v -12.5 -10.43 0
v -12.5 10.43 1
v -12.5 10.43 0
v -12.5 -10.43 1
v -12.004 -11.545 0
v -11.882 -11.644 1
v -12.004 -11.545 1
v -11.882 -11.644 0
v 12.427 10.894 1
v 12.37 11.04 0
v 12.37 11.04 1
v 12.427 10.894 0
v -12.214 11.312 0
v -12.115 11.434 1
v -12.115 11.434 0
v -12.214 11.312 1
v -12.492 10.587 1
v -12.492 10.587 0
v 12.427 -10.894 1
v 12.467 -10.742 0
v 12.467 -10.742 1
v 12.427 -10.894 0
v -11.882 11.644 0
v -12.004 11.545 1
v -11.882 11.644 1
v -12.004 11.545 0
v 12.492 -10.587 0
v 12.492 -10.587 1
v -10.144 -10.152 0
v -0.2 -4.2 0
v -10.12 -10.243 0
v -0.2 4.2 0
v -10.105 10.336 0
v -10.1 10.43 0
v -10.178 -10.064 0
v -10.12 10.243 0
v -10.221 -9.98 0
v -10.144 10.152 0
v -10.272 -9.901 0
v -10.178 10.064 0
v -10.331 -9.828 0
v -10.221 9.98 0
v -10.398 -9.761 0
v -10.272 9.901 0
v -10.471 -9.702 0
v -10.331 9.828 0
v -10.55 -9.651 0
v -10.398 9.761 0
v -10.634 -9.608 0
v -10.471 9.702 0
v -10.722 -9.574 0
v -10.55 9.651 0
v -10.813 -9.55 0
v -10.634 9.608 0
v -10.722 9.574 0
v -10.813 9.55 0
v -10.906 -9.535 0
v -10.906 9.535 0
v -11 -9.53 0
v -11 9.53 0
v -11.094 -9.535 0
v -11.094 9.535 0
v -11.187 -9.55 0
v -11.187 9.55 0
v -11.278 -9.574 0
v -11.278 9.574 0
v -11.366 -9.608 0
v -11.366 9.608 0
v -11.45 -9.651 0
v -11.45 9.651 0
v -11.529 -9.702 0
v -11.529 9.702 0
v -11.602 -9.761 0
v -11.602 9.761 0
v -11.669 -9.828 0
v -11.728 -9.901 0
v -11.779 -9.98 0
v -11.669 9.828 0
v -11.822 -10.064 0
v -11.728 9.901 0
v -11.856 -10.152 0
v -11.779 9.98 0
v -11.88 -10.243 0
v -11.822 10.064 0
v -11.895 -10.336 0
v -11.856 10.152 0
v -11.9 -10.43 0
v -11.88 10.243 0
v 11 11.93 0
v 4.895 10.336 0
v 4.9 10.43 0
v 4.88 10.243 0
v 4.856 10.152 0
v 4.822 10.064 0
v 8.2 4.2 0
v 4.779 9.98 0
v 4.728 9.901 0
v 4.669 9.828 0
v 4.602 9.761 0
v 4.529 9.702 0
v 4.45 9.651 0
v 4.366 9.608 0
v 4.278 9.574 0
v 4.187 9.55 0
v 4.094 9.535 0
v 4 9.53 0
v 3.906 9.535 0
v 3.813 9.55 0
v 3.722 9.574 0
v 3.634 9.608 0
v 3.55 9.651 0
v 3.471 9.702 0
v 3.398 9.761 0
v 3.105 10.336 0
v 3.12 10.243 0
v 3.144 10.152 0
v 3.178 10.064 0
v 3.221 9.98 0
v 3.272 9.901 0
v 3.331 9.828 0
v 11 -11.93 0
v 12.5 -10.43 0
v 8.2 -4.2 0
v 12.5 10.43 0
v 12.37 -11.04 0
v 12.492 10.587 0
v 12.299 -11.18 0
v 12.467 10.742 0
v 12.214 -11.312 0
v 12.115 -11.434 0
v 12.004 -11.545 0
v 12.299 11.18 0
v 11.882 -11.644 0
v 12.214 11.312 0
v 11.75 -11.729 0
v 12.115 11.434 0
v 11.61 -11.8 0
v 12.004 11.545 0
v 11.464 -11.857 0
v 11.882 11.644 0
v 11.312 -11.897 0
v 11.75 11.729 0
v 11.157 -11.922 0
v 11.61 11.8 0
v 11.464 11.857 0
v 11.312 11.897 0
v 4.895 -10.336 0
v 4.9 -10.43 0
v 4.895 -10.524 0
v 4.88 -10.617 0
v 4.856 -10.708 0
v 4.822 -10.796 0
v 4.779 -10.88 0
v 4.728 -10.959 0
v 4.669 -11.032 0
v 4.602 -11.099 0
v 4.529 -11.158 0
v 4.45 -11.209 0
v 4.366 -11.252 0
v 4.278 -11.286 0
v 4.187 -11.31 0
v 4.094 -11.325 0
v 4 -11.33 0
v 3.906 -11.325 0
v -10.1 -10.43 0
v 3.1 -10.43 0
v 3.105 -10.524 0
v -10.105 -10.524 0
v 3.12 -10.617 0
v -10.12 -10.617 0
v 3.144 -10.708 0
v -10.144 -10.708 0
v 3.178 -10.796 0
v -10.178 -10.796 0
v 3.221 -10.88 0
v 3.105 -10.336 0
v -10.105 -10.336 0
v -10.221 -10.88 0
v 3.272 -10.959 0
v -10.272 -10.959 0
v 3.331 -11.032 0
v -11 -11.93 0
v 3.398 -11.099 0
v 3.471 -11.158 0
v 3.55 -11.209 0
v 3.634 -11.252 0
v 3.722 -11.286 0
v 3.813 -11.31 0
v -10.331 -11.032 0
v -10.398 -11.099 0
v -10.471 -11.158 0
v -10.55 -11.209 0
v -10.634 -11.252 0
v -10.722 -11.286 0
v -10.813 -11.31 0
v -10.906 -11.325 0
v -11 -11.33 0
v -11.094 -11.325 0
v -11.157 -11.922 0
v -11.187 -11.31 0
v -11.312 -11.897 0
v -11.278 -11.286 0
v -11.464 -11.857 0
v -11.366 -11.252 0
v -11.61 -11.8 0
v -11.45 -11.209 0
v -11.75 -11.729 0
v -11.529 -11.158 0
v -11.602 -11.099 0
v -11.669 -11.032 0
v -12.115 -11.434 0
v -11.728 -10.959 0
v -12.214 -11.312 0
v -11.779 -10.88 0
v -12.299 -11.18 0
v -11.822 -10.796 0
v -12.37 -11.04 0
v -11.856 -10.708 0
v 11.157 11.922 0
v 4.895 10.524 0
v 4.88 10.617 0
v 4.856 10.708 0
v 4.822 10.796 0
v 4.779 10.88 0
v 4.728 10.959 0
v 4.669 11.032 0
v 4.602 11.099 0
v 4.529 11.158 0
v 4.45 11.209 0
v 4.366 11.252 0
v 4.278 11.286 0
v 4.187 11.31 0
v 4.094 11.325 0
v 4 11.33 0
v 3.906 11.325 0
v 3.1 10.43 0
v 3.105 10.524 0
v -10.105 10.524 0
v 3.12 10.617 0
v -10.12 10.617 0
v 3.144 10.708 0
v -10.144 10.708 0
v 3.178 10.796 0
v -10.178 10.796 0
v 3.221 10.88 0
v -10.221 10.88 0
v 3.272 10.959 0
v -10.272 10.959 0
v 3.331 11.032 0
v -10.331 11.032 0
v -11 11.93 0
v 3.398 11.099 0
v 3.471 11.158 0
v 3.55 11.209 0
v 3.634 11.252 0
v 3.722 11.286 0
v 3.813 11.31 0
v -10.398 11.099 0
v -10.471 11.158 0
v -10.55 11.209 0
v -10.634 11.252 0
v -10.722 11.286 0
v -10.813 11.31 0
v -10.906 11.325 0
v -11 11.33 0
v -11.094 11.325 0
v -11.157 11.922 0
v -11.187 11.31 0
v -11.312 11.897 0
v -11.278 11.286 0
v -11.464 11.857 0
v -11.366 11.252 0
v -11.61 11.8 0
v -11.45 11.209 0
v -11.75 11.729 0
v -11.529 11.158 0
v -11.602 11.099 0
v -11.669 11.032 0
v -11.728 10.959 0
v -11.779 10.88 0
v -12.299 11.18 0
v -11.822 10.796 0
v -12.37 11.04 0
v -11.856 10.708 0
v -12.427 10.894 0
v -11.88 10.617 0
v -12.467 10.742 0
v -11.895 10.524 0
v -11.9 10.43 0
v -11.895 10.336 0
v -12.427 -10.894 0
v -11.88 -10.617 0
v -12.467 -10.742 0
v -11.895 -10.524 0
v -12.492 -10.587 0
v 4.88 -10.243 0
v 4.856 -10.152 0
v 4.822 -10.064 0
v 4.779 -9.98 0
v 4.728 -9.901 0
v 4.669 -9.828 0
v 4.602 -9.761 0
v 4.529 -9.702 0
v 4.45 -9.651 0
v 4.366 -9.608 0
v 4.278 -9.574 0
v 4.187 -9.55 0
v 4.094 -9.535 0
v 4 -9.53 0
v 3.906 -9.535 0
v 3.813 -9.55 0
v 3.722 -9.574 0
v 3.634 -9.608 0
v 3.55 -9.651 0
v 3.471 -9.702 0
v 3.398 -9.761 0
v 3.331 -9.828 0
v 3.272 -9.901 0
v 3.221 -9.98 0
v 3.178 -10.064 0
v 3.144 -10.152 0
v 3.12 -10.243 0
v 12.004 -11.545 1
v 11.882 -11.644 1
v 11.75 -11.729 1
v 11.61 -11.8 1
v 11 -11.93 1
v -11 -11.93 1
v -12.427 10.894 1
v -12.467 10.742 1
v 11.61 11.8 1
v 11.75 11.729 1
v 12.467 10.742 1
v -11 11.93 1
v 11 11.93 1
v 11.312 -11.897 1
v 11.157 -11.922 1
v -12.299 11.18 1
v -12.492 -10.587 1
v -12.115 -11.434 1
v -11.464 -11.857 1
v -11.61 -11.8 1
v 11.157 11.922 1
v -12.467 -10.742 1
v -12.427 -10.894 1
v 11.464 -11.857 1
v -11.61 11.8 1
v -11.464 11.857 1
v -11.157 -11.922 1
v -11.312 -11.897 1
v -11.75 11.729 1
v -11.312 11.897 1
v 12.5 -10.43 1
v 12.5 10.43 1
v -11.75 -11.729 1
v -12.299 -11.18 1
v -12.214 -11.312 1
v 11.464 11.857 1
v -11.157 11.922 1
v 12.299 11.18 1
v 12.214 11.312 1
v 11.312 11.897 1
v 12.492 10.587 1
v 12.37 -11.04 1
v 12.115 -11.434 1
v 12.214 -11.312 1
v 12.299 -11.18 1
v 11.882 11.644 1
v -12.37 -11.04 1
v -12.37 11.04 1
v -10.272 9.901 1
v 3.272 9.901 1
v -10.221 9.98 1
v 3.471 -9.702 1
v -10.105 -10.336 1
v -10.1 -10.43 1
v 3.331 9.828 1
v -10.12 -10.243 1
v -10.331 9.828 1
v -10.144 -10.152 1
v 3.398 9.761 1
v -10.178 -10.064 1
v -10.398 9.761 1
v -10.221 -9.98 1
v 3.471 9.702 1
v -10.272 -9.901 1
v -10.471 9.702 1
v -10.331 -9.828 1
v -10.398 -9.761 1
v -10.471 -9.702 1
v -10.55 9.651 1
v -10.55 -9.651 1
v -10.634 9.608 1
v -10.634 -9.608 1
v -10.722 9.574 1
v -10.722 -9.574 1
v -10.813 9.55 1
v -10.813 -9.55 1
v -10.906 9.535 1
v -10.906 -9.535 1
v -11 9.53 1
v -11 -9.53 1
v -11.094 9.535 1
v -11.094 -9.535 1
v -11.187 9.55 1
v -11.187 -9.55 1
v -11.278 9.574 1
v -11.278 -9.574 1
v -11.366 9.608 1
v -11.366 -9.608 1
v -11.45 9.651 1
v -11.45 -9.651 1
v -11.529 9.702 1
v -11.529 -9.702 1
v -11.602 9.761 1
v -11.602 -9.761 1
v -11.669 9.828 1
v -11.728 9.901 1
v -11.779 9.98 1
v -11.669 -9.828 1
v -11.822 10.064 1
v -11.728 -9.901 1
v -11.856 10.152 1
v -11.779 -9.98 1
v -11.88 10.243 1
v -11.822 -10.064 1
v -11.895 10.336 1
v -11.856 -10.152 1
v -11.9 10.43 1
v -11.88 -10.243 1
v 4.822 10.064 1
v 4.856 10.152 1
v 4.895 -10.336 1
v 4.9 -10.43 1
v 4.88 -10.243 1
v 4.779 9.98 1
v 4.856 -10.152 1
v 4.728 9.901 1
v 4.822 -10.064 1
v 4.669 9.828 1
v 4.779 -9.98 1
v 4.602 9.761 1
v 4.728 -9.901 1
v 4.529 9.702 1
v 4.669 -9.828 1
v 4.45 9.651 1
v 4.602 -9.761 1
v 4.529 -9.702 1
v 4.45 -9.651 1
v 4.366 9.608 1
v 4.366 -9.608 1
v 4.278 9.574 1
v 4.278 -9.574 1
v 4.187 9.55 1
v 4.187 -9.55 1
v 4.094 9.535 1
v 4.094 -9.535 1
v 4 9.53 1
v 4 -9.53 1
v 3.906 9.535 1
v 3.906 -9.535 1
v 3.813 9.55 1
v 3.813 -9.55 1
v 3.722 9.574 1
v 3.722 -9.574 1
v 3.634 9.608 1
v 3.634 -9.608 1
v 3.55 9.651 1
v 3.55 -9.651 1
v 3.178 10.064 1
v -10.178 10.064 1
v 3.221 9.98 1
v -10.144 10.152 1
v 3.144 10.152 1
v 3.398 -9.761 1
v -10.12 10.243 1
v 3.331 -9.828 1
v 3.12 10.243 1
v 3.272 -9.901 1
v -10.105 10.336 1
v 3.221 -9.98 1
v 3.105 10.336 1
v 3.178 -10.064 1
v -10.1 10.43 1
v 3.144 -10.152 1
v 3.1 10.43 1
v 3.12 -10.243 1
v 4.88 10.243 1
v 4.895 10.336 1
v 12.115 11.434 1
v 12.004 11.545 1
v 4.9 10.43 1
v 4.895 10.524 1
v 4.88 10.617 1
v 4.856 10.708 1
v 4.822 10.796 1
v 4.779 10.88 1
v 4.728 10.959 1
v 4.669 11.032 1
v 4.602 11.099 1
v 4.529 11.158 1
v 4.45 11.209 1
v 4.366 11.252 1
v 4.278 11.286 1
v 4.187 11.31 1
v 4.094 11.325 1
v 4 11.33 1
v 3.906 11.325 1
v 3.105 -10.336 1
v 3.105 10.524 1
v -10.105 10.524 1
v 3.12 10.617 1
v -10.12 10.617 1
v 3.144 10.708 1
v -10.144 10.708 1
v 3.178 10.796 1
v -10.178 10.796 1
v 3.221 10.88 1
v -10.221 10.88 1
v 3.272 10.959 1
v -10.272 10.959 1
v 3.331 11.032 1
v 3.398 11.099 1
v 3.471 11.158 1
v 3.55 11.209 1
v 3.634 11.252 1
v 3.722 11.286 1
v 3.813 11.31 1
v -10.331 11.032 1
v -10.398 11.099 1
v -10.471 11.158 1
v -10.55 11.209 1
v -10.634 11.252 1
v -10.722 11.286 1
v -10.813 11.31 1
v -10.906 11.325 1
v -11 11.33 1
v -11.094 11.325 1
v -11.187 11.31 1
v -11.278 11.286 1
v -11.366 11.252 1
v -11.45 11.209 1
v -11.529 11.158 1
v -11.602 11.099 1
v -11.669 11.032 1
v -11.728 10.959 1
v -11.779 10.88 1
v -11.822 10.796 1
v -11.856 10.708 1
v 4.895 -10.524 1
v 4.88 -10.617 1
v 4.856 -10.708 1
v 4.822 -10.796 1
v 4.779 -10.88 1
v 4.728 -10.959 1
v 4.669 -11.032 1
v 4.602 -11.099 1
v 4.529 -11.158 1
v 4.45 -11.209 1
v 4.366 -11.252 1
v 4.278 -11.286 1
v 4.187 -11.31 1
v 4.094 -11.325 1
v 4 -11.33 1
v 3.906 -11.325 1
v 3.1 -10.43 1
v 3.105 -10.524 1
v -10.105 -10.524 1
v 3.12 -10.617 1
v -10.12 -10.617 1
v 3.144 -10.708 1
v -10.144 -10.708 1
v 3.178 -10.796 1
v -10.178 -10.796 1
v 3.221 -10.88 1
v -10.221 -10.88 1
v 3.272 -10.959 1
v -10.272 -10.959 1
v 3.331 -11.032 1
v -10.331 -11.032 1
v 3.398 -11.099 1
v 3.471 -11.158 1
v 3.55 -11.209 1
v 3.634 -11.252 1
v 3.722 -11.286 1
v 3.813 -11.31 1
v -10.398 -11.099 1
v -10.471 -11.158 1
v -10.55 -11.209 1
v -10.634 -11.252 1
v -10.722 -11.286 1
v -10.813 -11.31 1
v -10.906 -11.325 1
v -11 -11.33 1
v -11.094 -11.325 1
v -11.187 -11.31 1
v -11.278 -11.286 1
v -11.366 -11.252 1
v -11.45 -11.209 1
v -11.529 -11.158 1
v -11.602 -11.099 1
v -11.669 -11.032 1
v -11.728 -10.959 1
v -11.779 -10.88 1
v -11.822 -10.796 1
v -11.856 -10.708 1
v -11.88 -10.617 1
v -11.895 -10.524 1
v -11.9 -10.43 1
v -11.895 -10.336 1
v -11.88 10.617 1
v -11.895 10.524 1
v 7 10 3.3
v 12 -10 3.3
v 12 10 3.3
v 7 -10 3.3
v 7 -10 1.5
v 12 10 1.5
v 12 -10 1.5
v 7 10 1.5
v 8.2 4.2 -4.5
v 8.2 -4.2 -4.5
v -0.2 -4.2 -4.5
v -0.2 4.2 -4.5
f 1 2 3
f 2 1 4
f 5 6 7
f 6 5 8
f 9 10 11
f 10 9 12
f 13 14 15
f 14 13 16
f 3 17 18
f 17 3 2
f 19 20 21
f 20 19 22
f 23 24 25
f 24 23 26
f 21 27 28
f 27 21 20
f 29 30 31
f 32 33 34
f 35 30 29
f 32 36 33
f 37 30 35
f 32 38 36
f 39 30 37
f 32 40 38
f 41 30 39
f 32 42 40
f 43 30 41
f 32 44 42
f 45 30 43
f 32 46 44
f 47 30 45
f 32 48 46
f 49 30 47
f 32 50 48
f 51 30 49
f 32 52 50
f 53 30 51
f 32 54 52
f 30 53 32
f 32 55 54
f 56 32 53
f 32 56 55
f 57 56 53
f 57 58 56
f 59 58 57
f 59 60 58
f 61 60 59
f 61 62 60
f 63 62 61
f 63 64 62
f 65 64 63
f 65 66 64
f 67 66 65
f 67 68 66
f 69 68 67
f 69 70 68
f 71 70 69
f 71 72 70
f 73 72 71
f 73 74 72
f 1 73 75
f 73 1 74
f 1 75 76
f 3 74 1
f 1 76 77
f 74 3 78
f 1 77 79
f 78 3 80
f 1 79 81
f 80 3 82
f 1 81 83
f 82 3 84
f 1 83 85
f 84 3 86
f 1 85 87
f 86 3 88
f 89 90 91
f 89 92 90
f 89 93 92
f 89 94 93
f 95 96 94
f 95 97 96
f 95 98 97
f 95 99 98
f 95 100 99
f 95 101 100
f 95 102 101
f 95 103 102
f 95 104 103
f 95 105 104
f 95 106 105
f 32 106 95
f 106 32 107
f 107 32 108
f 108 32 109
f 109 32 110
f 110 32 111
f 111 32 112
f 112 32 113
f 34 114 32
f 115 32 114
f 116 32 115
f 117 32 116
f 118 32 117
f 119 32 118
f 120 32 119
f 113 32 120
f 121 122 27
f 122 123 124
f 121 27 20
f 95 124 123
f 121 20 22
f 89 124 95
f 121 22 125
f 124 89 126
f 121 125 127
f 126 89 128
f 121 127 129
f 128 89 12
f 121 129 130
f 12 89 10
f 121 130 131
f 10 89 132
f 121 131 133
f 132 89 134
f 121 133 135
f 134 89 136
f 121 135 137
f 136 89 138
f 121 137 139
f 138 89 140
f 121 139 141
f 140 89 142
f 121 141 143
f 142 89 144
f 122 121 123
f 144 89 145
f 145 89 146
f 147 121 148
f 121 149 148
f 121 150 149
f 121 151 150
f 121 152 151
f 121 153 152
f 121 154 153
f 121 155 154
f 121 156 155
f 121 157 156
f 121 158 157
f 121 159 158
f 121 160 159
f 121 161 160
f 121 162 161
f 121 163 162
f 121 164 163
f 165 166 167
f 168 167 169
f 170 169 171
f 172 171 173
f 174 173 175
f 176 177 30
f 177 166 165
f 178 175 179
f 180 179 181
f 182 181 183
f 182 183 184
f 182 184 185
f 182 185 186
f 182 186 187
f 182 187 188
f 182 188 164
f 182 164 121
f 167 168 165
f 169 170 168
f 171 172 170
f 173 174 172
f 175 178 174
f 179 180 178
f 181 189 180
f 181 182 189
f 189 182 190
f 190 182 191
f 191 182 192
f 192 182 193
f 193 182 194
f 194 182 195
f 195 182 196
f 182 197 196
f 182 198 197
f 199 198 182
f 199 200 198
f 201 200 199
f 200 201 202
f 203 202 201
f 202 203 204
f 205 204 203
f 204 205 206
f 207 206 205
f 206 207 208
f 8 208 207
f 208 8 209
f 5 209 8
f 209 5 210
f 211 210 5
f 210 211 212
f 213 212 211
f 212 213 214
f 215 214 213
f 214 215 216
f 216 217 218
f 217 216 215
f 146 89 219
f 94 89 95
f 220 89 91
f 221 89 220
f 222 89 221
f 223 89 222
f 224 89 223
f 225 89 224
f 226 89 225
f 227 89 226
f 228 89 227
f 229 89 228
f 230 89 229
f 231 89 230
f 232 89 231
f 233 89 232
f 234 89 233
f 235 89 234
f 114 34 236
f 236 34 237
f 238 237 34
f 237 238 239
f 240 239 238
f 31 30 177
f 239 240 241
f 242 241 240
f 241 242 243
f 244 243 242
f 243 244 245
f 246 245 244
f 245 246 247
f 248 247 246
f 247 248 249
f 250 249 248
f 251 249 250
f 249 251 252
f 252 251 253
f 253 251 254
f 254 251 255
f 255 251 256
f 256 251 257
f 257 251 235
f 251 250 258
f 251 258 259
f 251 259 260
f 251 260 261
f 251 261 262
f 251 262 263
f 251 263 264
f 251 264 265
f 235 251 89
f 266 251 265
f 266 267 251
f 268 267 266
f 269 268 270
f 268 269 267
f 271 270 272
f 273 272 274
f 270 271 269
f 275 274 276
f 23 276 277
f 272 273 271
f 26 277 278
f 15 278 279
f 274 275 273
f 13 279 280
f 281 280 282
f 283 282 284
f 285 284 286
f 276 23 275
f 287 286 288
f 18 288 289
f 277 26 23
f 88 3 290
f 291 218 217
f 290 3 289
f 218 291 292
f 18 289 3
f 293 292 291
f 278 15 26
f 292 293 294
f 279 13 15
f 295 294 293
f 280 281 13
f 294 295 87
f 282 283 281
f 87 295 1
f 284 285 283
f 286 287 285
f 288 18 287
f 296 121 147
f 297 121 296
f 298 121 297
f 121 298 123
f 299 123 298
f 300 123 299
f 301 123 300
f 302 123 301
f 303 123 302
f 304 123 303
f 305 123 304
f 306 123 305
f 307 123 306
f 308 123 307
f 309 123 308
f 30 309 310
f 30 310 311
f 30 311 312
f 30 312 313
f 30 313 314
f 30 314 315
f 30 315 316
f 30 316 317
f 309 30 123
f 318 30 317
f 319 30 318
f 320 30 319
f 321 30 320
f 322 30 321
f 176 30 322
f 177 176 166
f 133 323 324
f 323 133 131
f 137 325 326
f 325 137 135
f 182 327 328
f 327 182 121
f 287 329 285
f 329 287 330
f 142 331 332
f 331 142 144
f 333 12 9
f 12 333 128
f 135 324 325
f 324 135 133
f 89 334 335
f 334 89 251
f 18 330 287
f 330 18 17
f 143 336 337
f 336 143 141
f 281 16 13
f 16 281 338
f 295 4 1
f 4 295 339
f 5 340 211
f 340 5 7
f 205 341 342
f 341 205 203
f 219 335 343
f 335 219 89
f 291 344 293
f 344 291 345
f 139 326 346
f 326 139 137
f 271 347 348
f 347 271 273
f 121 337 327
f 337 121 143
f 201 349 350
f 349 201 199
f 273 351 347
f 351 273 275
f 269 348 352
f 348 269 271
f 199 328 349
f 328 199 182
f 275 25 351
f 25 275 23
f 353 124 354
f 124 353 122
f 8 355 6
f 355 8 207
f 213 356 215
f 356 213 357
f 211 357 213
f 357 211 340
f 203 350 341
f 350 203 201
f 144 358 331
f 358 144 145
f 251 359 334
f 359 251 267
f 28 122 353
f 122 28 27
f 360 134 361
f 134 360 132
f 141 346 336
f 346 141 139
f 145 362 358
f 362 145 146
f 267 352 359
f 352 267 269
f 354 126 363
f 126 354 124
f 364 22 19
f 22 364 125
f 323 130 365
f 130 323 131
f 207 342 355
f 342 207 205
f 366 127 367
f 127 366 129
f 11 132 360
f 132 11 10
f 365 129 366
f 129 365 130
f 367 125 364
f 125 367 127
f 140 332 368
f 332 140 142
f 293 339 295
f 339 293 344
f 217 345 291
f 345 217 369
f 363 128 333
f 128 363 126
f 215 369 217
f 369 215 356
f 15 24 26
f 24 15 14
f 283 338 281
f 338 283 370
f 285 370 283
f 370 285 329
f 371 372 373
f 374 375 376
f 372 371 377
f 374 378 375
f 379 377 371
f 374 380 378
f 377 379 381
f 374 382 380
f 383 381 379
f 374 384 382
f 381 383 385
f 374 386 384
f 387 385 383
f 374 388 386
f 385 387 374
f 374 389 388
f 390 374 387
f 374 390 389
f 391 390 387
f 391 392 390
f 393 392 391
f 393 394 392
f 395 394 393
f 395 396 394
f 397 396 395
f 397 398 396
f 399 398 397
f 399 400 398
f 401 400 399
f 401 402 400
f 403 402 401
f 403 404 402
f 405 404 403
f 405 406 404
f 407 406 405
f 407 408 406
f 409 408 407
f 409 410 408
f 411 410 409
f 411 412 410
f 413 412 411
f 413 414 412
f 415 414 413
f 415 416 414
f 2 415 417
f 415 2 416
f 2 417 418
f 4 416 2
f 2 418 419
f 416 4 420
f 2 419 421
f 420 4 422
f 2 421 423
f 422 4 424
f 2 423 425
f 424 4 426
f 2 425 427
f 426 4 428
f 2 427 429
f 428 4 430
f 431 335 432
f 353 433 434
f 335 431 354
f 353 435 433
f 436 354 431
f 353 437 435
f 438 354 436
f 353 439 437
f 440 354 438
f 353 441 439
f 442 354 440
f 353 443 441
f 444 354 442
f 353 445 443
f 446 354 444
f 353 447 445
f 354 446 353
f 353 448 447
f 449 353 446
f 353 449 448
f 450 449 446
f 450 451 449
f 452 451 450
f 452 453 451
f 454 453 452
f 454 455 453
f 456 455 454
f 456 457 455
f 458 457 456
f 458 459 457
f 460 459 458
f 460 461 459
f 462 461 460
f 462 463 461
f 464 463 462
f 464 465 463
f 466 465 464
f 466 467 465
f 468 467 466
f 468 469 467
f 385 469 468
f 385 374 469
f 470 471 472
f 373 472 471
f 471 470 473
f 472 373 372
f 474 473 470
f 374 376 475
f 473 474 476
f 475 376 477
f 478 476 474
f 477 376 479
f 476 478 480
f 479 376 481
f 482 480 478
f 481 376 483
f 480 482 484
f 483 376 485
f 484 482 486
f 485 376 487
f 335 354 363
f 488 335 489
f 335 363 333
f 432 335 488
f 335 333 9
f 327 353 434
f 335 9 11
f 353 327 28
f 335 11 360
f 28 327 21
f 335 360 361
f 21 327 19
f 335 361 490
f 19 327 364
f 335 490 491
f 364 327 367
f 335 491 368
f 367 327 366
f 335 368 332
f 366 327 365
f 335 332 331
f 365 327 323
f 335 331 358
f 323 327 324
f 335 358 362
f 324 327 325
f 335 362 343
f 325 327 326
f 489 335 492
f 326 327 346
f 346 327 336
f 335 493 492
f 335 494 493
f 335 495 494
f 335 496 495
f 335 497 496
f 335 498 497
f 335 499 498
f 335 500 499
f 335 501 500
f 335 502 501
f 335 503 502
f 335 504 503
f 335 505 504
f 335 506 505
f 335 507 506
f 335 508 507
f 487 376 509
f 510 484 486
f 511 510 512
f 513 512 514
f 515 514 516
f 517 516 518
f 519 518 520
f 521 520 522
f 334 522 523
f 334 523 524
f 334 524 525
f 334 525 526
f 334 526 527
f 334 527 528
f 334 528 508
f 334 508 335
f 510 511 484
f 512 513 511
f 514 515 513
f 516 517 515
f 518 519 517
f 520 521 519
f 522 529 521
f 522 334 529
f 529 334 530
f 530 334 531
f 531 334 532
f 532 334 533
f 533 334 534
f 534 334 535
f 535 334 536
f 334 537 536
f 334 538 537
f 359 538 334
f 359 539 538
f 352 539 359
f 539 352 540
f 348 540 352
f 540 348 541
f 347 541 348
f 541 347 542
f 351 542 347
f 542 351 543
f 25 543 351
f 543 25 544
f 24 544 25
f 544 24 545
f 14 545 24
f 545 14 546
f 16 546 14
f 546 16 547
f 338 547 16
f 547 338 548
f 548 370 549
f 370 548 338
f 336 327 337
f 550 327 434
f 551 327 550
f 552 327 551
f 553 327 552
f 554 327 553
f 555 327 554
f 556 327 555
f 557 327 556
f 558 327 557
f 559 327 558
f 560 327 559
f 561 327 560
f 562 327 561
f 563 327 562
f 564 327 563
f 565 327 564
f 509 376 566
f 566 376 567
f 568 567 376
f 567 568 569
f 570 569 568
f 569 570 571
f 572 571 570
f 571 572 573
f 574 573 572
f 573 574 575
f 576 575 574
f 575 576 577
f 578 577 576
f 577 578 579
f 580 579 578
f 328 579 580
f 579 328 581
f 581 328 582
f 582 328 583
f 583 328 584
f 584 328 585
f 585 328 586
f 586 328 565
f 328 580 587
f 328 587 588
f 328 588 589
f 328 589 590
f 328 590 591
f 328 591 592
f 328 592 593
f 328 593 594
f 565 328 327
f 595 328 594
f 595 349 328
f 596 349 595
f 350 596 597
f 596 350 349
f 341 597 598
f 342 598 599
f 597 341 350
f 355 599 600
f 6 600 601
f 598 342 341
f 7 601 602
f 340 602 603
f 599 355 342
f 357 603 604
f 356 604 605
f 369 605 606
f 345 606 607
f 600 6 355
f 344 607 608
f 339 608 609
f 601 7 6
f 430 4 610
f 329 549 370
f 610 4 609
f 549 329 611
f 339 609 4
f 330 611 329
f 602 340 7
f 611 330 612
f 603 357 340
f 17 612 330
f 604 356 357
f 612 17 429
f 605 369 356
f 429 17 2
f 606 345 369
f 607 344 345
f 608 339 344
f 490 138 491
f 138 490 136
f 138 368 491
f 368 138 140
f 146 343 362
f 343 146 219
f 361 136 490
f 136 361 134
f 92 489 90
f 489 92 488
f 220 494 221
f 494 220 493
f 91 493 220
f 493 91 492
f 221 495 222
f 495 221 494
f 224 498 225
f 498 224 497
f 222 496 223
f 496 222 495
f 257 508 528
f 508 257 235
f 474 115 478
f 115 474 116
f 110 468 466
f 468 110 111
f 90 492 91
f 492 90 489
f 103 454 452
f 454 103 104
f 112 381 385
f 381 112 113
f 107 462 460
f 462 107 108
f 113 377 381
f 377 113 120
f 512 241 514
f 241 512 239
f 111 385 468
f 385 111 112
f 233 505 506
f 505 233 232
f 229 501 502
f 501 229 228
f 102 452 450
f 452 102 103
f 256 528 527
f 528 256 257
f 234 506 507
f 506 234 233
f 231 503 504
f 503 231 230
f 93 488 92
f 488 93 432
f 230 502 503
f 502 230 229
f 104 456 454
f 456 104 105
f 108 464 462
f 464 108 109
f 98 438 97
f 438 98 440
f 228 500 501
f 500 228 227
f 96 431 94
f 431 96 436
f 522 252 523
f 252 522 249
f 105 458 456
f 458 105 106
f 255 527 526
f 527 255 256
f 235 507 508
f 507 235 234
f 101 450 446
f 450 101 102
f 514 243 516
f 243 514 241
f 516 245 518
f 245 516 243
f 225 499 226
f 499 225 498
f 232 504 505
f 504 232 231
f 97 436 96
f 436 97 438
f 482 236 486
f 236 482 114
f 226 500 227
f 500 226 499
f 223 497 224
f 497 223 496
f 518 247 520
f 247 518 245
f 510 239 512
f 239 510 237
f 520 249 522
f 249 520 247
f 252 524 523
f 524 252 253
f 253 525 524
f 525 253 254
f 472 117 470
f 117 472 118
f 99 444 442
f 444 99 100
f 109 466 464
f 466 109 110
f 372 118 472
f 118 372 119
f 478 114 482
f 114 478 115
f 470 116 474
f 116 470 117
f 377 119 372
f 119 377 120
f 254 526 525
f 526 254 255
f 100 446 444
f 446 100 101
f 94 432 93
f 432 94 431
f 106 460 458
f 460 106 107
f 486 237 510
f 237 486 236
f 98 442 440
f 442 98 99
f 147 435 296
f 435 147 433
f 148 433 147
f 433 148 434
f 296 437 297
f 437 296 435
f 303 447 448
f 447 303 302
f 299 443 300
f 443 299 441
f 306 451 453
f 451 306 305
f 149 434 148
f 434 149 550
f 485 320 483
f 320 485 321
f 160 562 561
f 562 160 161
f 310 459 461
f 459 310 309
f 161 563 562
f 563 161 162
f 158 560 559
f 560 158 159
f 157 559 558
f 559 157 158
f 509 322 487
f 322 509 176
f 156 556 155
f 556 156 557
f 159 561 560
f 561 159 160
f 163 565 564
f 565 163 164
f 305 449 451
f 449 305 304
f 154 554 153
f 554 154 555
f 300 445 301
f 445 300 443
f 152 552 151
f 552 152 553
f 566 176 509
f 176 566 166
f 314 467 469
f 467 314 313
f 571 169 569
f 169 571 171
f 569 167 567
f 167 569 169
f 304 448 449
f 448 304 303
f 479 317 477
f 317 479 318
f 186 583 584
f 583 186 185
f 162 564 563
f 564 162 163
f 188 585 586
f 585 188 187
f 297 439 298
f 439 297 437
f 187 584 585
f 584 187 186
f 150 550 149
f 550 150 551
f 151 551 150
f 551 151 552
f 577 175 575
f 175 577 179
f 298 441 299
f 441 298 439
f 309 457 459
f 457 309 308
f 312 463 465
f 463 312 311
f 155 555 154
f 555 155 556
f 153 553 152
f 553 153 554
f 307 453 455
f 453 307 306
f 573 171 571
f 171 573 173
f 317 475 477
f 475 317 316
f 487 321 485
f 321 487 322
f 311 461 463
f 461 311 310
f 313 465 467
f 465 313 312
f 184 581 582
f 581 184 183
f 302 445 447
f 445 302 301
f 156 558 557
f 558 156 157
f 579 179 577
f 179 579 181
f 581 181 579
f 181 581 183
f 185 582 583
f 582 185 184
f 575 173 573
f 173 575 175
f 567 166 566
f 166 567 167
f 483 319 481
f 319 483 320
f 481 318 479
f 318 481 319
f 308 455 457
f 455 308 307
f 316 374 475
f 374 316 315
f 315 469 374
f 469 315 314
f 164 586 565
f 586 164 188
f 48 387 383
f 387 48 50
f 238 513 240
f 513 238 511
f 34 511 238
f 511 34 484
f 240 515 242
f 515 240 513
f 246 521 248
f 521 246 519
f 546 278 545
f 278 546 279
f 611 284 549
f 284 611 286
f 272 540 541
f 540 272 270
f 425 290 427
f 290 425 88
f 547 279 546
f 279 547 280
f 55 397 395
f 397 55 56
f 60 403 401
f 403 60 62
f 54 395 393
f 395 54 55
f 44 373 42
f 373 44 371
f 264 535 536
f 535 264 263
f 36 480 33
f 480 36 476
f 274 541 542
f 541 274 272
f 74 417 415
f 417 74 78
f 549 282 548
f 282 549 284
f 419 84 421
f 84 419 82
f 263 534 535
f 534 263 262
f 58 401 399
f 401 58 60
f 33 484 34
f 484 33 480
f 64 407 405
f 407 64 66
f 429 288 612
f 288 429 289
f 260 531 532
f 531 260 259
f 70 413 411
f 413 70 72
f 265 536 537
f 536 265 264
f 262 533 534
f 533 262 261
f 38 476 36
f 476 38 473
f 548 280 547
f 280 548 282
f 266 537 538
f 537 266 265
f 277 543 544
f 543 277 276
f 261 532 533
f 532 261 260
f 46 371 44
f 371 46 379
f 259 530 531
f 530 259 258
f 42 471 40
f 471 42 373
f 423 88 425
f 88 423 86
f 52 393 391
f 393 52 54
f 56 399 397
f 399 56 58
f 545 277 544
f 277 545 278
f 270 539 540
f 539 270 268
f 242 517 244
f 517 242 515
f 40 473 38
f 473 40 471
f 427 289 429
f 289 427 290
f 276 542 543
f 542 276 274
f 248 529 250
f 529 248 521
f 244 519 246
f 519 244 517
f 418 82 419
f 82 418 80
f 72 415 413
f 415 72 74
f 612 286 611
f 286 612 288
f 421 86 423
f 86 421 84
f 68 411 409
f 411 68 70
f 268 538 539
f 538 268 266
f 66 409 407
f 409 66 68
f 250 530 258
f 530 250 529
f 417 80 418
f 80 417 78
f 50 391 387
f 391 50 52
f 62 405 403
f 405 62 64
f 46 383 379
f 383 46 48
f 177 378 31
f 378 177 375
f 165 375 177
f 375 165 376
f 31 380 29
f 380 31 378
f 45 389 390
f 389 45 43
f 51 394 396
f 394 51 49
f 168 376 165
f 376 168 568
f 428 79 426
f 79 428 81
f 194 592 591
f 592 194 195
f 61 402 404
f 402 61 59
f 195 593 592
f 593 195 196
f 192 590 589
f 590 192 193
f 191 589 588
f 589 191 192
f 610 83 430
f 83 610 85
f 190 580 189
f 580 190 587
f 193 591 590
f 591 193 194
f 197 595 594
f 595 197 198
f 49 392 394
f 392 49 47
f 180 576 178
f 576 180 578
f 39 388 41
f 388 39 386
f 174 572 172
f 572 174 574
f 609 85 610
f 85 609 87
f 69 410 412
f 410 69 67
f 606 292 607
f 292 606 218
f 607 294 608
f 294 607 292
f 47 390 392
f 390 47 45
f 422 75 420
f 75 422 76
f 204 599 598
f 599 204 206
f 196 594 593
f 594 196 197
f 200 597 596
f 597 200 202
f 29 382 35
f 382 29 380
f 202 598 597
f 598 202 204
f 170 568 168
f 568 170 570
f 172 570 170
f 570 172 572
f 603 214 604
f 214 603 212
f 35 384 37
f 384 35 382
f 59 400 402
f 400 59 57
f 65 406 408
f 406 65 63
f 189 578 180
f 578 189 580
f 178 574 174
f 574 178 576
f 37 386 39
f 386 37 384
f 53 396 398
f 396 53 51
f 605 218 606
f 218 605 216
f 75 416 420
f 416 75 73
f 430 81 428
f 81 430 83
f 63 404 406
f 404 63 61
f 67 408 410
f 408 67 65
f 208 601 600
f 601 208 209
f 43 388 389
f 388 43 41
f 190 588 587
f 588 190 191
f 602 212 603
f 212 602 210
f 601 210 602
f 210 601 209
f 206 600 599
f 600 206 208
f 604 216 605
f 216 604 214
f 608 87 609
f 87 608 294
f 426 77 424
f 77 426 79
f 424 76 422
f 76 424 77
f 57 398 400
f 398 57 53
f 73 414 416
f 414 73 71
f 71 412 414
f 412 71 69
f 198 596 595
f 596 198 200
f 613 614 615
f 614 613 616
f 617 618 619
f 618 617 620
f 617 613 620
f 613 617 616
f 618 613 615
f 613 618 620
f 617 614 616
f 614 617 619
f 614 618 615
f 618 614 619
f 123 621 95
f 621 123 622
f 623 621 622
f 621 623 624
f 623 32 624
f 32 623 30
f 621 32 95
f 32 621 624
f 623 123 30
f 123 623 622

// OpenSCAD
// file: include/pcb.scad
// Modules and constants for mocking up printed circuit boards

// Conventions:
// -- the long side is x, narrow side is y
// -- the bottom of the board is at z=0

// Header base
hdr_base_x = 2.5;
hdr_base_y = 2.5;
hdr_base_z = 2.5;

// Header pin
hdr_pin_x = 0.7;
hdr_pin_y = 0.7;
hdr_pin_z = 11.75;

// Common components, spec: [x size, y size, z size, color]
micro_usb = [5.0, 7.5, 2.5, "silver"];
jst2 = [6.0, 8.0, 4.0, "white"];
hdmi = [7.25, 11.25, 3.3, "Silver"];
sd_card_holder = [12.0, 11.5, 1.3, "Silver"];

// Printed circuit board with rounded corners
module pcb(x, y, board_h = 1.5, r = 2.5) {
  x_pos = x / 2 - r;
  y_pos = y / 2 - r;

  hull() for (i = [- x_pos, x_pos], j = [- y_pos, y_pos]) {
    translate([i, j, 0]) cylinder(r = r, h = board_h);
  }
}

// Hole in the pcb
module pcb_hole(x, y, r, board_h = 1.5) {
  translate([x, y, - 0.1]) cylinder(h = board_h + 0.2, r = r);
}

// Component that sits on top of the pcb
// TODO support bottom mounted components
module pcb_component(spec, x, y, yaw = 0.0, board_h = 1.5) {
  color(spec[3])
    translate([x, y, board_h + spec[2] / 2])
      rotate([0, 0, yaw])
        cube([spec[0], spec[1], spec[2]], center = true);
}

// Header (base + pin)
module pcb_header(x, y, base_z, pin_z) {
  color("Black")
    translate([x, y, base_z])
      cube([hdr_base_x, hdr_base_y, hdr_base_z], center = true);
  color("Silver")
    translate([x, y, pin_z])
      cube([hdr_pin_x, hdr_pin_y, hdr_pin_z], center = true);
}
// file: include/pi_camera.scad
include <pcb.scad>

// PCB
cam_x = 25;
cam_y = 23.86;
cam_z = 1;
cam_corner_r = 1.5;

// Mount holes
cam_hole_edge = 1.5;  // Distance from edge to center of mount hole
cam_hole_d = 1.8;
cam_hole_r = cam_hole_d / 2;
cam_hole_x = cam_x / 2 - cam_hole_edge;
cam_hole_y = cam_y / 2 - cam_hole_edge;

// Components, see pcb.scad::pcb_component()
csi_socket = [4, 20, 1.8, "Ivory"];
csi_clip = [1, 20, 1.8, "DimGray"];
camera = [8.4, 8.4, 4.5, "Gray"];

// Old version
module pi_camera_0() {
  union() {
    translate([- 25 / 2 + 2.5, - 10, 22.3]) cube([20, 5, 2.5]);
    translate([- 25 / 2, - 10, 22.3]) cube([25, 24.5, 1]);
    cylinder(h = 22.3, r = 8.3);
  }
}

module pi_camera() {
  color("LimeGreen") difference() {
    pcb(cam_x, cam_y, cam_z, cam_corner_r);
    pcb_hole(cam_hole_x - 7, cam_hole_y, cam_hole_r, cam_z);  // Holes avoid the CSI connector
    pcb_hole(cam_hole_x - 7, - cam_hole_y, cam_hole_r, cam_z);
    pcb_hole(- cam_hole_x, cam_hole_y, cam_hole_r, cam_z);
    pcb_hole(- cam_hole_x, - cam_hole_y, cam_hole_r, cam_z);
  }

  pcb_component(csi_socket, 9, 0);
  pcb_component(csi_clip, 11.5, 0);
  pcb_component(camera, 4, 0, board_h = -4.5);  // On the bottom of the board
}
// main file
include <include/pi_camera.scad>

// Hi-def render
$fn = 60;

pi_camera();
